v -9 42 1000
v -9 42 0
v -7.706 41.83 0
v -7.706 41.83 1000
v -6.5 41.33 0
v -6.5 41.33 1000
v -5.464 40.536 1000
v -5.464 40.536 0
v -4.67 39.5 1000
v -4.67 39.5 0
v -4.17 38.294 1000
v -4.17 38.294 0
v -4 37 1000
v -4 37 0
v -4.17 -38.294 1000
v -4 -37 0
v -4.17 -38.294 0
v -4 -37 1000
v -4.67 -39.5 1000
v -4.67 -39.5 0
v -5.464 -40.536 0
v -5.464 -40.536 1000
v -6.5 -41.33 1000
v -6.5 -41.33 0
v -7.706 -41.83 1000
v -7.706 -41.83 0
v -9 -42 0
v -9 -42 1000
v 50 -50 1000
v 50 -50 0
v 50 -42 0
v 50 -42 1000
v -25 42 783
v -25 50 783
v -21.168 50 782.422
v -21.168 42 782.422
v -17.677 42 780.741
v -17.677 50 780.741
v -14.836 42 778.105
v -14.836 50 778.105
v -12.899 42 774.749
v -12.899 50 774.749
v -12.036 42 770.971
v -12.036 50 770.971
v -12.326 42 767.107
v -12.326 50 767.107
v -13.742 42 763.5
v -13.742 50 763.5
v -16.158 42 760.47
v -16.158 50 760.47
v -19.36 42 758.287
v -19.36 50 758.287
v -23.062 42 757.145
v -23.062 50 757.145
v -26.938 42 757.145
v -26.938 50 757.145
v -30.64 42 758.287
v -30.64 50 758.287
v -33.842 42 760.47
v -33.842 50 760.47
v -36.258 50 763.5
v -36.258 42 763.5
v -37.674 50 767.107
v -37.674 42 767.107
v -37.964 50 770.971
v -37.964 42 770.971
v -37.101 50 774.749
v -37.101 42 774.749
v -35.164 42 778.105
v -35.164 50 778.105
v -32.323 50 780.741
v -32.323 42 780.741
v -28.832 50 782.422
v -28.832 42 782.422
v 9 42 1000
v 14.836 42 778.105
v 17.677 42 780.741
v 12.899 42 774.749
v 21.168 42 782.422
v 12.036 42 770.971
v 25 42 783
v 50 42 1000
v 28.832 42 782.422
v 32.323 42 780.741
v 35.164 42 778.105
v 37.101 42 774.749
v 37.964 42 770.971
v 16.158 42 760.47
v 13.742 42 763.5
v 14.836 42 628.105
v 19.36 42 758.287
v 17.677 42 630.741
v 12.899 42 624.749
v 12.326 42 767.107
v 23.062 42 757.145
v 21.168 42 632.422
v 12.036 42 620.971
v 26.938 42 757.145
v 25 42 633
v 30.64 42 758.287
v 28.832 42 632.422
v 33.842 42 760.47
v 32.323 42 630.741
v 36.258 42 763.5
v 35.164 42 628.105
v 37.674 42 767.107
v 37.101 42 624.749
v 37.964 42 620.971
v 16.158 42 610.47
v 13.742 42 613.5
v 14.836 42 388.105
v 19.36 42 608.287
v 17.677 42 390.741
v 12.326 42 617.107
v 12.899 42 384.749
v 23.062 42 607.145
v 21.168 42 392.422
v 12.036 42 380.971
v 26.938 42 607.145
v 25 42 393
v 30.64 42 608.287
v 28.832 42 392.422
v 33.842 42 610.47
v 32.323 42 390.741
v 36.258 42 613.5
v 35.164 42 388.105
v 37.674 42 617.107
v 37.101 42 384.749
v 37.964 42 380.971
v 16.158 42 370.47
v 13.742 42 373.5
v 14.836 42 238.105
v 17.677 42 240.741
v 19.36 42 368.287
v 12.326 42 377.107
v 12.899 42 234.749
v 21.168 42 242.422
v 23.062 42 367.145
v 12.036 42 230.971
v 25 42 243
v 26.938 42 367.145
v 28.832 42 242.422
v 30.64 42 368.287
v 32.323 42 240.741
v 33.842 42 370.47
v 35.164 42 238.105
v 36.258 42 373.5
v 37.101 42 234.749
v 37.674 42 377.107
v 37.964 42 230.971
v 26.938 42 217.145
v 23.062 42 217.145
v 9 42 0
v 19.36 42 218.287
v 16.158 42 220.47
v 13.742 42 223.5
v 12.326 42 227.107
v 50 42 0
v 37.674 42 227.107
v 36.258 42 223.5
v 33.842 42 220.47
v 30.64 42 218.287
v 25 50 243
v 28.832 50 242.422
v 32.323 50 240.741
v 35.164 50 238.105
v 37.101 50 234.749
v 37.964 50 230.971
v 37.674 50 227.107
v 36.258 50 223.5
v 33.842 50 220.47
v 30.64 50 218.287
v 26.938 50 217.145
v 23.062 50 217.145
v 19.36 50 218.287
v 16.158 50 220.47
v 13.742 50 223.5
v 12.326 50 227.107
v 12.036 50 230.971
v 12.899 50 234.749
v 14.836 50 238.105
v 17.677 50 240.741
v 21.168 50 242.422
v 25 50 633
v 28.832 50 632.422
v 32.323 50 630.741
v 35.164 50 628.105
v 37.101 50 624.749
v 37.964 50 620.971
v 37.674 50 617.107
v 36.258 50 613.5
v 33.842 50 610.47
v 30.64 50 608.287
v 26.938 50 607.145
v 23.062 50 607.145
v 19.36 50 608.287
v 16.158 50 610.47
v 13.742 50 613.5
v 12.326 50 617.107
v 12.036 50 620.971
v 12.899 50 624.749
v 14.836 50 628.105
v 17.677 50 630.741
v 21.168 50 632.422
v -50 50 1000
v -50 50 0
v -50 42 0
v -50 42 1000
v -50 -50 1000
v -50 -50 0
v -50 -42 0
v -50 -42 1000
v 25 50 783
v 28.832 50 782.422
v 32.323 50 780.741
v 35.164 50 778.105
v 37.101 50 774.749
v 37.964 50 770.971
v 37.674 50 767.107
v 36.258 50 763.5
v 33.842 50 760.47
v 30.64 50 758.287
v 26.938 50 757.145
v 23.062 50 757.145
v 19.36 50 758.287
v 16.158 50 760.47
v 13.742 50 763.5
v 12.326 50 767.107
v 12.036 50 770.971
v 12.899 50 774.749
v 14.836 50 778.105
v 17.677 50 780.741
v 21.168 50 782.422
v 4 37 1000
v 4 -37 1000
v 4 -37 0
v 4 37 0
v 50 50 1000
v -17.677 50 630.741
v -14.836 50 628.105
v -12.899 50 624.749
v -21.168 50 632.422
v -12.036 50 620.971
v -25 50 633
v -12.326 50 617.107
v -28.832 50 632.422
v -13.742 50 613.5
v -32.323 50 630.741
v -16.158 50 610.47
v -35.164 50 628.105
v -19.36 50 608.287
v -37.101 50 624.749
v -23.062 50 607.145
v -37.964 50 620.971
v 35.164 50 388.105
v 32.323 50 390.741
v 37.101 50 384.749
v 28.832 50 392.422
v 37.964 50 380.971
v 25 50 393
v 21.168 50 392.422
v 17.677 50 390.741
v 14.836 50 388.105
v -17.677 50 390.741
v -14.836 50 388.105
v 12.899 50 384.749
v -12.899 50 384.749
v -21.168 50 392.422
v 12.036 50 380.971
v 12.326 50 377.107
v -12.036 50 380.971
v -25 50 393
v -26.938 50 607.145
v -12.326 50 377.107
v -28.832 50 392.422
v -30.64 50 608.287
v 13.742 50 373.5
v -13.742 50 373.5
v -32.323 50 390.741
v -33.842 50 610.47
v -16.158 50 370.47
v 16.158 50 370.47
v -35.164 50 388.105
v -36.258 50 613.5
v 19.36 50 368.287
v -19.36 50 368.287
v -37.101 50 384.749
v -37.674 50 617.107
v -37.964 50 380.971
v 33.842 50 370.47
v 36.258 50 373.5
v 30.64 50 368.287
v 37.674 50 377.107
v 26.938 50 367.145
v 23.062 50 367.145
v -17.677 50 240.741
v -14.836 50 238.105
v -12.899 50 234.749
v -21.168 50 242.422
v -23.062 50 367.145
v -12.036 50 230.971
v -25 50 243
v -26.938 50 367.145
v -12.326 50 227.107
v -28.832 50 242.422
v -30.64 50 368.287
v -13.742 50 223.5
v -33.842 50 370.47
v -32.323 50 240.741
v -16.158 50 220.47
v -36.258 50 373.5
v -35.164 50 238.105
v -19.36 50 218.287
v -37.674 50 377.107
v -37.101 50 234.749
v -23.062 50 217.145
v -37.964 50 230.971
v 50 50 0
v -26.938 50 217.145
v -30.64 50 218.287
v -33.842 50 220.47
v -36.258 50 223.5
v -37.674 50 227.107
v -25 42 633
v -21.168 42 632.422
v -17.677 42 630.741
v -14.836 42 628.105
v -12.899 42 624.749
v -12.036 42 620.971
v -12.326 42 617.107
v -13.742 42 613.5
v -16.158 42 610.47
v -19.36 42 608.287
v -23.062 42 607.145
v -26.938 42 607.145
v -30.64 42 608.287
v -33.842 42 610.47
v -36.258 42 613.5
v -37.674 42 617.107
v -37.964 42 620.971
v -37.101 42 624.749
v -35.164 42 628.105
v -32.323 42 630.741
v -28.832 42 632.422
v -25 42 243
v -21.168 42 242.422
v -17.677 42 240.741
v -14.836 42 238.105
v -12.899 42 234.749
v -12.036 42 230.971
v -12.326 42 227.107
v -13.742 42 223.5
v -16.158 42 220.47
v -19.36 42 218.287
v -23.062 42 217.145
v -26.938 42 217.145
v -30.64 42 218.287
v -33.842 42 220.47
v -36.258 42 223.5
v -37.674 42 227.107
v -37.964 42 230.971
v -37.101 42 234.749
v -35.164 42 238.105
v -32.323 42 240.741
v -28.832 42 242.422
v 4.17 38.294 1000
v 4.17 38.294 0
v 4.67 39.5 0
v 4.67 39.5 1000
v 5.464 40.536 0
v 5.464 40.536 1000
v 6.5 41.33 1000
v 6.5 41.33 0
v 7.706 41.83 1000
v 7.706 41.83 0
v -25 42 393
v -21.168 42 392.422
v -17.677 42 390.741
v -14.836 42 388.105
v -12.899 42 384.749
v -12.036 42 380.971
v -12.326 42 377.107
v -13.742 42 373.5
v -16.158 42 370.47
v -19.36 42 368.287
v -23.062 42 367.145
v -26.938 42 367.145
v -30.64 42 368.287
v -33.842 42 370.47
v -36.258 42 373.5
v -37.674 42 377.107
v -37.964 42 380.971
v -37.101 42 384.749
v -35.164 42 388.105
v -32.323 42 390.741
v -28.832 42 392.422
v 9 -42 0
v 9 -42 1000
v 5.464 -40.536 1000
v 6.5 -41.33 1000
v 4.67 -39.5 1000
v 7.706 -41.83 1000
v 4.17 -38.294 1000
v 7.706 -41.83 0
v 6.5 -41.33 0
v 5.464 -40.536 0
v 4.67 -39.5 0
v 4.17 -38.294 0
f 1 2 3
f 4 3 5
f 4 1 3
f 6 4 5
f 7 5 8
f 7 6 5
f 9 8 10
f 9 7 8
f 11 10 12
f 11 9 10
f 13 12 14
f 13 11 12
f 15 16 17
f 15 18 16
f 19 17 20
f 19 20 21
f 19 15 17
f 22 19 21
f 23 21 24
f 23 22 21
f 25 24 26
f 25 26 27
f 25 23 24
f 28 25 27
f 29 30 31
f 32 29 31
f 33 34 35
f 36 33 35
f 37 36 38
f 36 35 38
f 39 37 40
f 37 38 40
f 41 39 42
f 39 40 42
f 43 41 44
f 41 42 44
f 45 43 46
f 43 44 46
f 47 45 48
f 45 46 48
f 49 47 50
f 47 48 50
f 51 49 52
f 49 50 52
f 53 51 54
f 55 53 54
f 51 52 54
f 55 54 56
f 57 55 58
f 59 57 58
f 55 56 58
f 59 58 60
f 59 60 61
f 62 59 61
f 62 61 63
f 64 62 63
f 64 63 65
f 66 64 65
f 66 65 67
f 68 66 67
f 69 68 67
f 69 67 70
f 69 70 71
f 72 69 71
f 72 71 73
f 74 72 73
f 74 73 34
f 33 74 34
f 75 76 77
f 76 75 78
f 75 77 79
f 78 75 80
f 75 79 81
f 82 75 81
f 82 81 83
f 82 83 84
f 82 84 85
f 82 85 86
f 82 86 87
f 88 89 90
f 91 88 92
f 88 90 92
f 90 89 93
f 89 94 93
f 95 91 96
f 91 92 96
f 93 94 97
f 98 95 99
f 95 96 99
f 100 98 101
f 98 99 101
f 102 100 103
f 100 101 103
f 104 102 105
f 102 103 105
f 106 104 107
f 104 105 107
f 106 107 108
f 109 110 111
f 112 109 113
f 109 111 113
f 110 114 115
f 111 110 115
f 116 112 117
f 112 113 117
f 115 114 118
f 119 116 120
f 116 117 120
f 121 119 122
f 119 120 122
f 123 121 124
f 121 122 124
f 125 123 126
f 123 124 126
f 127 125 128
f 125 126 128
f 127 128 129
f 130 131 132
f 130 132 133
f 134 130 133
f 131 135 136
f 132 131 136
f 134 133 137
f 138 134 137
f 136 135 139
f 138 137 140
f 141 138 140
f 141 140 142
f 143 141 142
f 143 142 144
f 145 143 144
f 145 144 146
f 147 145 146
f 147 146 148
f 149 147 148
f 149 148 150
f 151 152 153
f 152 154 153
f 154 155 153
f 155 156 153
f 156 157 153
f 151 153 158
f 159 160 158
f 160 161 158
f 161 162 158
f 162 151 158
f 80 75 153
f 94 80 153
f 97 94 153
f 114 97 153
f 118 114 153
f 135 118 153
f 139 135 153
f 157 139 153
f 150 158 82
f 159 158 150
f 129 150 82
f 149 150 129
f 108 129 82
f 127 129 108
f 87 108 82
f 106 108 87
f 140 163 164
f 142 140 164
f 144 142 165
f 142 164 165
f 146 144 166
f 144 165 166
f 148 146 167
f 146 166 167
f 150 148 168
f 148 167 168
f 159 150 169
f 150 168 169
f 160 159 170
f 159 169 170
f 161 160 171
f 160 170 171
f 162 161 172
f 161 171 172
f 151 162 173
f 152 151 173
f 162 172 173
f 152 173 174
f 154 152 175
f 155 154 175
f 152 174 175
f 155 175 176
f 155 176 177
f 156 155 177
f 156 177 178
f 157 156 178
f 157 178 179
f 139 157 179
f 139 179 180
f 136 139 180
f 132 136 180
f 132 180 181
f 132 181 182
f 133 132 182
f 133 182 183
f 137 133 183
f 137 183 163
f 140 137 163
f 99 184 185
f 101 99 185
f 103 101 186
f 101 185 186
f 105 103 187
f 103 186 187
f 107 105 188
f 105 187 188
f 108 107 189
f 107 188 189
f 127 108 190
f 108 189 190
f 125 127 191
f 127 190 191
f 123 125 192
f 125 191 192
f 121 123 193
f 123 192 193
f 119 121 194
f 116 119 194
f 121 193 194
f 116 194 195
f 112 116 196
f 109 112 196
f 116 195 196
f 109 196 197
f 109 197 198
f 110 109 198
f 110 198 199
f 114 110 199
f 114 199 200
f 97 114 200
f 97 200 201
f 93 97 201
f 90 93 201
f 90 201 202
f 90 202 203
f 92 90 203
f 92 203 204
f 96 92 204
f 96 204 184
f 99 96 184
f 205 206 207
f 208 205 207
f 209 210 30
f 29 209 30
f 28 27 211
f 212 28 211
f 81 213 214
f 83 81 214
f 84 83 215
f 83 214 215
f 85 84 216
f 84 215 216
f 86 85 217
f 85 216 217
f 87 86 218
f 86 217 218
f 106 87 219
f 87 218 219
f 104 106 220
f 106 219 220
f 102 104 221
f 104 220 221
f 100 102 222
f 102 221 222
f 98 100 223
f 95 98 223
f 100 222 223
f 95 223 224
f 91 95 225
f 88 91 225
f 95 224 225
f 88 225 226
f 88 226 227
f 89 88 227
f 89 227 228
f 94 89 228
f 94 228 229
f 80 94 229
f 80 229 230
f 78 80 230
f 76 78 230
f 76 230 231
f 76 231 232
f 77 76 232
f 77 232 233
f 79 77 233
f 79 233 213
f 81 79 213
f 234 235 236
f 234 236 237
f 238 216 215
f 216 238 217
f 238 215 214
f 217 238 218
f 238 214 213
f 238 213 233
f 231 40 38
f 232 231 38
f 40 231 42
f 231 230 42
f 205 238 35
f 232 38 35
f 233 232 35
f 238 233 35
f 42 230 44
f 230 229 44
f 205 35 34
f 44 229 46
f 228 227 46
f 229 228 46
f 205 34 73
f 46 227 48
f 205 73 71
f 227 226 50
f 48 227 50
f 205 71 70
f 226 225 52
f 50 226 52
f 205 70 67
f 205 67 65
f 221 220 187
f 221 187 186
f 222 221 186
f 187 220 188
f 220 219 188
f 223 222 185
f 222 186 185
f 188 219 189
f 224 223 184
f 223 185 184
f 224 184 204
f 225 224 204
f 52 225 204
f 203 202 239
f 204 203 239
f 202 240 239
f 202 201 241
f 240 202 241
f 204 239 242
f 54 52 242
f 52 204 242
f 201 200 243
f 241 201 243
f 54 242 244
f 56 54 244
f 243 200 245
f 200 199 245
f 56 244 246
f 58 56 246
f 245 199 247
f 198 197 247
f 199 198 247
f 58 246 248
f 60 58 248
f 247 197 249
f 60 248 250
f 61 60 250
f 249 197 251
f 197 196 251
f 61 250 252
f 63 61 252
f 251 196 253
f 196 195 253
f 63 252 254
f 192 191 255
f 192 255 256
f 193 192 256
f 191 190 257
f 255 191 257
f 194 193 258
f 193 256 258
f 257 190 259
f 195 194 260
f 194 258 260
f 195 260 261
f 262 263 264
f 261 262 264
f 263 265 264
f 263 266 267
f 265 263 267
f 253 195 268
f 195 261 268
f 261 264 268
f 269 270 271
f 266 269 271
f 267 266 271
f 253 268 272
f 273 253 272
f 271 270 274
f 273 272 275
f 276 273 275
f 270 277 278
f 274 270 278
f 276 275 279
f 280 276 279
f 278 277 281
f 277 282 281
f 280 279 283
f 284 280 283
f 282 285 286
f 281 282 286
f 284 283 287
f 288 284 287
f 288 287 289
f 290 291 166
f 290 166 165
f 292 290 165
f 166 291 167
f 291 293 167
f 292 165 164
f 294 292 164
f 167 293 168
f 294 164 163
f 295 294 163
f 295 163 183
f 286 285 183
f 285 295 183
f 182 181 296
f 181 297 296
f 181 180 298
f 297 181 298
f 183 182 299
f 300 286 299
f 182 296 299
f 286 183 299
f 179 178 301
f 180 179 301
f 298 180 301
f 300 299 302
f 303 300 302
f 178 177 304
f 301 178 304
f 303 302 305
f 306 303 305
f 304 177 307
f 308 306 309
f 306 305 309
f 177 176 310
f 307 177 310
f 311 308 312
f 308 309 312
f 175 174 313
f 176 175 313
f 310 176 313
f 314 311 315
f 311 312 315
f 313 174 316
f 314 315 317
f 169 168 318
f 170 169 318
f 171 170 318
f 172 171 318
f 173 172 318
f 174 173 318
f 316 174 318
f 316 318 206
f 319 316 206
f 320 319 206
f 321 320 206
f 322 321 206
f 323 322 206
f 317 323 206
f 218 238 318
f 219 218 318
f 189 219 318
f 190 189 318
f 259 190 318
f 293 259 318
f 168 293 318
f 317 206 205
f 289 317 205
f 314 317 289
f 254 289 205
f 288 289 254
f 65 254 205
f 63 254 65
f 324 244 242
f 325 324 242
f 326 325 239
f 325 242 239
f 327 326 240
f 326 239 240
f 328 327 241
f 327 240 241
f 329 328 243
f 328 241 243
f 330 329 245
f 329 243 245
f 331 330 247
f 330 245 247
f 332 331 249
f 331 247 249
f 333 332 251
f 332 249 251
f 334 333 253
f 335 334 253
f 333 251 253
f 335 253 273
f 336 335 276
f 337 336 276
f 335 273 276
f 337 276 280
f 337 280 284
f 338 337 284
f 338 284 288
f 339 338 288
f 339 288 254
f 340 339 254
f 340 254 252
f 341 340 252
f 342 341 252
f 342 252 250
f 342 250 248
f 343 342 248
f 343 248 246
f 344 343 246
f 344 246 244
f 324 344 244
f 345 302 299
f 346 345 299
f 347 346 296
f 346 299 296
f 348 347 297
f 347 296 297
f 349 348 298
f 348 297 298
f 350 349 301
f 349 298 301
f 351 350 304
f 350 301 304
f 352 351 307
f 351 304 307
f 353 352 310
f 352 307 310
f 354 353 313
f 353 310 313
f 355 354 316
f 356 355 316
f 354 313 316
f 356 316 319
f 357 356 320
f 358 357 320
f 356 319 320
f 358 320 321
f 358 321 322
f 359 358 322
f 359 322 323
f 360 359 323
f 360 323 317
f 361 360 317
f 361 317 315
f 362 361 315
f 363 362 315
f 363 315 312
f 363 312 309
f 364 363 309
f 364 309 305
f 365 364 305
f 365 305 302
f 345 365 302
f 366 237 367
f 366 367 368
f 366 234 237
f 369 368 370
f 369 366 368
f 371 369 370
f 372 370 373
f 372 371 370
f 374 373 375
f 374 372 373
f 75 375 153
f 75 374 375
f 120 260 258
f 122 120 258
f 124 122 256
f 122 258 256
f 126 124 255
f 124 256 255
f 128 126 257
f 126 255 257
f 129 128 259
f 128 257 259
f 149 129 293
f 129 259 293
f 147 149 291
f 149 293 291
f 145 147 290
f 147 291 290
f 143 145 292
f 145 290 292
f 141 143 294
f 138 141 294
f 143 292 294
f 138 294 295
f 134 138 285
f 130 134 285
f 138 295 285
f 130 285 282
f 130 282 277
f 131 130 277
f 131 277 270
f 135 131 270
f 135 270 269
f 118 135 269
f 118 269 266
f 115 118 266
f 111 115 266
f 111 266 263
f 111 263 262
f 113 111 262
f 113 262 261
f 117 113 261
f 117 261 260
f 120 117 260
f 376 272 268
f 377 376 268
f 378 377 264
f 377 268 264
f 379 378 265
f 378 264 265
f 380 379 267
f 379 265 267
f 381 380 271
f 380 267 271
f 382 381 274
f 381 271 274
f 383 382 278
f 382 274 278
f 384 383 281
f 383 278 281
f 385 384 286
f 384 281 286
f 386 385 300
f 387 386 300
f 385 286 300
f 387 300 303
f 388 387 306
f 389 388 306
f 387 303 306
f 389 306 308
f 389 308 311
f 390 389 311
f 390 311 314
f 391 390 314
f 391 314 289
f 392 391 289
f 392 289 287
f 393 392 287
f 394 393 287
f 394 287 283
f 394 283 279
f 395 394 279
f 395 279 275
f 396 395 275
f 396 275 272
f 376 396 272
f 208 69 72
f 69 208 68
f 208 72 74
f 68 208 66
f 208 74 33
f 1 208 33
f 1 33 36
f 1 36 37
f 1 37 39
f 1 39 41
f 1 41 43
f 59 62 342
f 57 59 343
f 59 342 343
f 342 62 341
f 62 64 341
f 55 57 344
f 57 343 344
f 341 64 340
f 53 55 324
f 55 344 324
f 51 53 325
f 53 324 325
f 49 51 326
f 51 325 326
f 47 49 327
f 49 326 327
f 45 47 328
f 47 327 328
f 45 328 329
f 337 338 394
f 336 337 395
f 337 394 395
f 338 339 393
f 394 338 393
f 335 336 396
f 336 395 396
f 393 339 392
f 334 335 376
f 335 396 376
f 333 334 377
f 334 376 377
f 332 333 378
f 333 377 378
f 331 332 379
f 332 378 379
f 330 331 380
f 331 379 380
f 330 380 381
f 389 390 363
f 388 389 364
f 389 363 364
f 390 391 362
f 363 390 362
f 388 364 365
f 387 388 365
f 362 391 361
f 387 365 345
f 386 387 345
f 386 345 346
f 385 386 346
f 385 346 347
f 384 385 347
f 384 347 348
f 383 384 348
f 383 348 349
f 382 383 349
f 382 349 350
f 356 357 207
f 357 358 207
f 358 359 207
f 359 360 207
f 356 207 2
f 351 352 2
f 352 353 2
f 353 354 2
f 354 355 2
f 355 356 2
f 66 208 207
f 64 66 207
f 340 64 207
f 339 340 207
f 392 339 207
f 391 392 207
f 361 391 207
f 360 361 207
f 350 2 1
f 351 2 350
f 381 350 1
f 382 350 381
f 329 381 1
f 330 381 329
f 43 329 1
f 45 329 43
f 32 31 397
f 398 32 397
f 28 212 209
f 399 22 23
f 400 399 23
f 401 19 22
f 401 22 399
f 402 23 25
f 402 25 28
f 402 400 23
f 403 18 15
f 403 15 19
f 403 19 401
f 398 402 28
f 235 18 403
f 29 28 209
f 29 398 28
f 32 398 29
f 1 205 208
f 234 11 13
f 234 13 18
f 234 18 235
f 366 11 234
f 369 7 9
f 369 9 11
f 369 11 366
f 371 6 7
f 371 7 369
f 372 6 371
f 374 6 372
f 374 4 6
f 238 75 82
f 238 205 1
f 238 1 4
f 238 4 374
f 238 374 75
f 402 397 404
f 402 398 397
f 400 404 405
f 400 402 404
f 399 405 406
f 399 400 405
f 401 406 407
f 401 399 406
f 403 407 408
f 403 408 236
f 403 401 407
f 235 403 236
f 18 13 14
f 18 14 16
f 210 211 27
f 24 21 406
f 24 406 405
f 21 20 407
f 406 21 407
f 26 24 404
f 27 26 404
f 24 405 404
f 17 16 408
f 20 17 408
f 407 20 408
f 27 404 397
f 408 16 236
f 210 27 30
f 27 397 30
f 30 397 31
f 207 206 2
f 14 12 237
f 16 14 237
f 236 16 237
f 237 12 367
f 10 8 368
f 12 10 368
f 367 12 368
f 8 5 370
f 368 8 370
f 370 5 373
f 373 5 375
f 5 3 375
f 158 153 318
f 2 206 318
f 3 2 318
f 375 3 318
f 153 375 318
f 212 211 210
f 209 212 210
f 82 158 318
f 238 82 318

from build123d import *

# Parameters (mm, degrees)
BOSS_EXTRUDE1_DEPTH = 1000
FILLET1_R           = 5
SKETCH2_R           = 13
CUT_EXTRUDE1_DEPTH  = 10
SKETCH3_R           = 13
CUT_EXTRUDE2_DEPTH  = 10
SKETCH4_W           = 10
SKETCH4_H           = 30
BOSS_EXTRUDE2_DEPTH = 146
SKETCH6_R           = 15
BOSS_EXTRUDE4_DEPTH = 10
SPLIT1_START        = 495
SPLIT1_OUTLINE_R    = 15
SPLIT1_DEPTH        = 10
SPLIT2_START        = 495
SPLIT2_OUTLINE_R    = 15
SPLIT2_DEPTH        = 10


# Read off the part's stored shape, not the designer's step: Split1, Split2
with BuildPart() as part:
    # Sketch1 → Boss-Extrude1 (new body)
    with BuildSketch(Plane.XY):
        Polygon((-50, 42), (-4, 42), (-4, -42), (-50, -42), (-50, -50), (50, -50), (50, -42), (4, -42), (4, 42), (50, 42), (50, 50), (-50, 50), align=None)
    extrude(amount=BOSS_EXTRUDE1_DEPTH)

    # Fillet1
    fillet1_edges = [part.edges().sort_by_distance(p)[0] for p in [
        (4, 42, 500),
        (4, -42, 500),
        (-4, -42, 500),
        (-4, 42, 500),
    ]]
    fillet(fillet1_edges, radius=FILLET1_R)

    # Sketch2 → Cut-Extrude1 (cut)
    with BuildSketch(Plane(origin=(0, 50, 0), x_dir=(1, 0, 0), z_dir=(0, 1, 0))):
        with Locations(Location((25, -770, 0), (0, 0, 270))):
            Circle(SKETCH2_R)
        with Locations(Location((-25, -770, 0), (0, 0, 270))):
            Circle(SKETCH2_R)
        with Locations(Location((25, -230, 0), (0, 0, 270))):
            Circle(SKETCH2_R)
        with Locations(Location((-25, -230, 0), (0, 0, 270))):
            Circle(SKETCH2_R)
    extrude(amount=-CUT_EXTRUDE1_DEPTH, mode=Mode.SUBTRACT)

    # Sketch3 → Cut-Extrude2 (cut)
    with BuildSketch(Plane(origin=(0, 50, 0), x_dir=(1, 0, 0), z_dir=(0, 1, 0))):
        with Locations(Location((-25, -620, 0), (0, 0, 270))):
            Circle(SKETCH3_R)
        with Locations(Location((25, -620, 0), (0, 0, 270))):
            Circle(SKETCH3_R)
        with Locations(Location((25, -380, 0), (0, 0, 270))):
            Circle(SKETCH3_R)
        with Locations(Location((-25, -380, 0), (0, 0, 270))):
            Circle(SKETCH3_R)
    extrude(amount=-CUT_EXTRUDE2_DEPTH, mode=Mode.SUBTRACT)

    # Sketch4 → Boss-Extrude2 (add)
    with BuildSketch(Plane(origin=(4, 0, 0), x_dir=(0, 0, -1), z_dir=(1, 0, 0))):
        with Locations((-500, -5.392878346)):
            Rectangle(SKETCH4_W, SKETCH4_H)
    boss_extrude2 = extrude(amount=BOSS_EXTRUDE2_DEPTH)

    # Sketch6 → Boss-Extrude4 (add)
    with BuildSketch(Plane.XY.offset(505)):
        Polygon((150, 9.607121654), (150, -70.392878346), (180, -70.392878346), (220, -20.392878346), (220, 9.607121654), align=None)
        with Locations((185, -10.392878346)):
            Circle(SKETCH6_R, mode=Mode.SUBTRACT)
    boss_extrude4 = extrude(amount=-BOSS_EXTRUDE4_DEPTH)

    # Mirror1: Boss-Extrude2, Boss-Extrude4 across plane
    add(boss_extrude2.mirror(Plane(origin=(0, 0, 0), x_dir=(0, 0, 1), z_dir=(1, 0, 0))))
    add(boss_extrude4.mirror(Plane(origin=(0, 0, 0), x_dir=(0, 0, 1), z_dir=(1, 0, 0))))

    # Split1 outline → Split1 (cut)
    with BuildSketch(Plane.XY.offset(SPLIT1_START)):
        Polygon((-150, -20.392878346), (-4, -20.392878346), (-4, 9.607121654), (-220, 9.607121654), (-220, -20.392878346), (-180, -70.392878346), (-150, -70.392878346), align=None)
        with Locations((-185, -10.392878346)):
            Circle(SPLIT1_OUTLINE_R, mode=Mode.SUBTRACT)
    extrude(amount=SPLIT1_DEPTH, mode=Mode.SUBTRACT)

    # Split2 outline → Split2 (cut)
    with BuildSketch(Plane.XY.offset(SPLIT2_START)):
        Polygon((4, -20.392878346), (150, -20.392878346), (150, -70.392878346), (180, -70.392878346), (220, -20.392878346), (220, 9.607121654), (4, 9.607121654), align=None)
        with Locations((185, -10.392878346)):
            Circle(SPLIT2_OUTLINE_R, mode=Mode.SUBTRACT)
    extrude(amount=SPLIT2_DEPTH, mode=Mode.SUBTRACT)


solid = part.part
